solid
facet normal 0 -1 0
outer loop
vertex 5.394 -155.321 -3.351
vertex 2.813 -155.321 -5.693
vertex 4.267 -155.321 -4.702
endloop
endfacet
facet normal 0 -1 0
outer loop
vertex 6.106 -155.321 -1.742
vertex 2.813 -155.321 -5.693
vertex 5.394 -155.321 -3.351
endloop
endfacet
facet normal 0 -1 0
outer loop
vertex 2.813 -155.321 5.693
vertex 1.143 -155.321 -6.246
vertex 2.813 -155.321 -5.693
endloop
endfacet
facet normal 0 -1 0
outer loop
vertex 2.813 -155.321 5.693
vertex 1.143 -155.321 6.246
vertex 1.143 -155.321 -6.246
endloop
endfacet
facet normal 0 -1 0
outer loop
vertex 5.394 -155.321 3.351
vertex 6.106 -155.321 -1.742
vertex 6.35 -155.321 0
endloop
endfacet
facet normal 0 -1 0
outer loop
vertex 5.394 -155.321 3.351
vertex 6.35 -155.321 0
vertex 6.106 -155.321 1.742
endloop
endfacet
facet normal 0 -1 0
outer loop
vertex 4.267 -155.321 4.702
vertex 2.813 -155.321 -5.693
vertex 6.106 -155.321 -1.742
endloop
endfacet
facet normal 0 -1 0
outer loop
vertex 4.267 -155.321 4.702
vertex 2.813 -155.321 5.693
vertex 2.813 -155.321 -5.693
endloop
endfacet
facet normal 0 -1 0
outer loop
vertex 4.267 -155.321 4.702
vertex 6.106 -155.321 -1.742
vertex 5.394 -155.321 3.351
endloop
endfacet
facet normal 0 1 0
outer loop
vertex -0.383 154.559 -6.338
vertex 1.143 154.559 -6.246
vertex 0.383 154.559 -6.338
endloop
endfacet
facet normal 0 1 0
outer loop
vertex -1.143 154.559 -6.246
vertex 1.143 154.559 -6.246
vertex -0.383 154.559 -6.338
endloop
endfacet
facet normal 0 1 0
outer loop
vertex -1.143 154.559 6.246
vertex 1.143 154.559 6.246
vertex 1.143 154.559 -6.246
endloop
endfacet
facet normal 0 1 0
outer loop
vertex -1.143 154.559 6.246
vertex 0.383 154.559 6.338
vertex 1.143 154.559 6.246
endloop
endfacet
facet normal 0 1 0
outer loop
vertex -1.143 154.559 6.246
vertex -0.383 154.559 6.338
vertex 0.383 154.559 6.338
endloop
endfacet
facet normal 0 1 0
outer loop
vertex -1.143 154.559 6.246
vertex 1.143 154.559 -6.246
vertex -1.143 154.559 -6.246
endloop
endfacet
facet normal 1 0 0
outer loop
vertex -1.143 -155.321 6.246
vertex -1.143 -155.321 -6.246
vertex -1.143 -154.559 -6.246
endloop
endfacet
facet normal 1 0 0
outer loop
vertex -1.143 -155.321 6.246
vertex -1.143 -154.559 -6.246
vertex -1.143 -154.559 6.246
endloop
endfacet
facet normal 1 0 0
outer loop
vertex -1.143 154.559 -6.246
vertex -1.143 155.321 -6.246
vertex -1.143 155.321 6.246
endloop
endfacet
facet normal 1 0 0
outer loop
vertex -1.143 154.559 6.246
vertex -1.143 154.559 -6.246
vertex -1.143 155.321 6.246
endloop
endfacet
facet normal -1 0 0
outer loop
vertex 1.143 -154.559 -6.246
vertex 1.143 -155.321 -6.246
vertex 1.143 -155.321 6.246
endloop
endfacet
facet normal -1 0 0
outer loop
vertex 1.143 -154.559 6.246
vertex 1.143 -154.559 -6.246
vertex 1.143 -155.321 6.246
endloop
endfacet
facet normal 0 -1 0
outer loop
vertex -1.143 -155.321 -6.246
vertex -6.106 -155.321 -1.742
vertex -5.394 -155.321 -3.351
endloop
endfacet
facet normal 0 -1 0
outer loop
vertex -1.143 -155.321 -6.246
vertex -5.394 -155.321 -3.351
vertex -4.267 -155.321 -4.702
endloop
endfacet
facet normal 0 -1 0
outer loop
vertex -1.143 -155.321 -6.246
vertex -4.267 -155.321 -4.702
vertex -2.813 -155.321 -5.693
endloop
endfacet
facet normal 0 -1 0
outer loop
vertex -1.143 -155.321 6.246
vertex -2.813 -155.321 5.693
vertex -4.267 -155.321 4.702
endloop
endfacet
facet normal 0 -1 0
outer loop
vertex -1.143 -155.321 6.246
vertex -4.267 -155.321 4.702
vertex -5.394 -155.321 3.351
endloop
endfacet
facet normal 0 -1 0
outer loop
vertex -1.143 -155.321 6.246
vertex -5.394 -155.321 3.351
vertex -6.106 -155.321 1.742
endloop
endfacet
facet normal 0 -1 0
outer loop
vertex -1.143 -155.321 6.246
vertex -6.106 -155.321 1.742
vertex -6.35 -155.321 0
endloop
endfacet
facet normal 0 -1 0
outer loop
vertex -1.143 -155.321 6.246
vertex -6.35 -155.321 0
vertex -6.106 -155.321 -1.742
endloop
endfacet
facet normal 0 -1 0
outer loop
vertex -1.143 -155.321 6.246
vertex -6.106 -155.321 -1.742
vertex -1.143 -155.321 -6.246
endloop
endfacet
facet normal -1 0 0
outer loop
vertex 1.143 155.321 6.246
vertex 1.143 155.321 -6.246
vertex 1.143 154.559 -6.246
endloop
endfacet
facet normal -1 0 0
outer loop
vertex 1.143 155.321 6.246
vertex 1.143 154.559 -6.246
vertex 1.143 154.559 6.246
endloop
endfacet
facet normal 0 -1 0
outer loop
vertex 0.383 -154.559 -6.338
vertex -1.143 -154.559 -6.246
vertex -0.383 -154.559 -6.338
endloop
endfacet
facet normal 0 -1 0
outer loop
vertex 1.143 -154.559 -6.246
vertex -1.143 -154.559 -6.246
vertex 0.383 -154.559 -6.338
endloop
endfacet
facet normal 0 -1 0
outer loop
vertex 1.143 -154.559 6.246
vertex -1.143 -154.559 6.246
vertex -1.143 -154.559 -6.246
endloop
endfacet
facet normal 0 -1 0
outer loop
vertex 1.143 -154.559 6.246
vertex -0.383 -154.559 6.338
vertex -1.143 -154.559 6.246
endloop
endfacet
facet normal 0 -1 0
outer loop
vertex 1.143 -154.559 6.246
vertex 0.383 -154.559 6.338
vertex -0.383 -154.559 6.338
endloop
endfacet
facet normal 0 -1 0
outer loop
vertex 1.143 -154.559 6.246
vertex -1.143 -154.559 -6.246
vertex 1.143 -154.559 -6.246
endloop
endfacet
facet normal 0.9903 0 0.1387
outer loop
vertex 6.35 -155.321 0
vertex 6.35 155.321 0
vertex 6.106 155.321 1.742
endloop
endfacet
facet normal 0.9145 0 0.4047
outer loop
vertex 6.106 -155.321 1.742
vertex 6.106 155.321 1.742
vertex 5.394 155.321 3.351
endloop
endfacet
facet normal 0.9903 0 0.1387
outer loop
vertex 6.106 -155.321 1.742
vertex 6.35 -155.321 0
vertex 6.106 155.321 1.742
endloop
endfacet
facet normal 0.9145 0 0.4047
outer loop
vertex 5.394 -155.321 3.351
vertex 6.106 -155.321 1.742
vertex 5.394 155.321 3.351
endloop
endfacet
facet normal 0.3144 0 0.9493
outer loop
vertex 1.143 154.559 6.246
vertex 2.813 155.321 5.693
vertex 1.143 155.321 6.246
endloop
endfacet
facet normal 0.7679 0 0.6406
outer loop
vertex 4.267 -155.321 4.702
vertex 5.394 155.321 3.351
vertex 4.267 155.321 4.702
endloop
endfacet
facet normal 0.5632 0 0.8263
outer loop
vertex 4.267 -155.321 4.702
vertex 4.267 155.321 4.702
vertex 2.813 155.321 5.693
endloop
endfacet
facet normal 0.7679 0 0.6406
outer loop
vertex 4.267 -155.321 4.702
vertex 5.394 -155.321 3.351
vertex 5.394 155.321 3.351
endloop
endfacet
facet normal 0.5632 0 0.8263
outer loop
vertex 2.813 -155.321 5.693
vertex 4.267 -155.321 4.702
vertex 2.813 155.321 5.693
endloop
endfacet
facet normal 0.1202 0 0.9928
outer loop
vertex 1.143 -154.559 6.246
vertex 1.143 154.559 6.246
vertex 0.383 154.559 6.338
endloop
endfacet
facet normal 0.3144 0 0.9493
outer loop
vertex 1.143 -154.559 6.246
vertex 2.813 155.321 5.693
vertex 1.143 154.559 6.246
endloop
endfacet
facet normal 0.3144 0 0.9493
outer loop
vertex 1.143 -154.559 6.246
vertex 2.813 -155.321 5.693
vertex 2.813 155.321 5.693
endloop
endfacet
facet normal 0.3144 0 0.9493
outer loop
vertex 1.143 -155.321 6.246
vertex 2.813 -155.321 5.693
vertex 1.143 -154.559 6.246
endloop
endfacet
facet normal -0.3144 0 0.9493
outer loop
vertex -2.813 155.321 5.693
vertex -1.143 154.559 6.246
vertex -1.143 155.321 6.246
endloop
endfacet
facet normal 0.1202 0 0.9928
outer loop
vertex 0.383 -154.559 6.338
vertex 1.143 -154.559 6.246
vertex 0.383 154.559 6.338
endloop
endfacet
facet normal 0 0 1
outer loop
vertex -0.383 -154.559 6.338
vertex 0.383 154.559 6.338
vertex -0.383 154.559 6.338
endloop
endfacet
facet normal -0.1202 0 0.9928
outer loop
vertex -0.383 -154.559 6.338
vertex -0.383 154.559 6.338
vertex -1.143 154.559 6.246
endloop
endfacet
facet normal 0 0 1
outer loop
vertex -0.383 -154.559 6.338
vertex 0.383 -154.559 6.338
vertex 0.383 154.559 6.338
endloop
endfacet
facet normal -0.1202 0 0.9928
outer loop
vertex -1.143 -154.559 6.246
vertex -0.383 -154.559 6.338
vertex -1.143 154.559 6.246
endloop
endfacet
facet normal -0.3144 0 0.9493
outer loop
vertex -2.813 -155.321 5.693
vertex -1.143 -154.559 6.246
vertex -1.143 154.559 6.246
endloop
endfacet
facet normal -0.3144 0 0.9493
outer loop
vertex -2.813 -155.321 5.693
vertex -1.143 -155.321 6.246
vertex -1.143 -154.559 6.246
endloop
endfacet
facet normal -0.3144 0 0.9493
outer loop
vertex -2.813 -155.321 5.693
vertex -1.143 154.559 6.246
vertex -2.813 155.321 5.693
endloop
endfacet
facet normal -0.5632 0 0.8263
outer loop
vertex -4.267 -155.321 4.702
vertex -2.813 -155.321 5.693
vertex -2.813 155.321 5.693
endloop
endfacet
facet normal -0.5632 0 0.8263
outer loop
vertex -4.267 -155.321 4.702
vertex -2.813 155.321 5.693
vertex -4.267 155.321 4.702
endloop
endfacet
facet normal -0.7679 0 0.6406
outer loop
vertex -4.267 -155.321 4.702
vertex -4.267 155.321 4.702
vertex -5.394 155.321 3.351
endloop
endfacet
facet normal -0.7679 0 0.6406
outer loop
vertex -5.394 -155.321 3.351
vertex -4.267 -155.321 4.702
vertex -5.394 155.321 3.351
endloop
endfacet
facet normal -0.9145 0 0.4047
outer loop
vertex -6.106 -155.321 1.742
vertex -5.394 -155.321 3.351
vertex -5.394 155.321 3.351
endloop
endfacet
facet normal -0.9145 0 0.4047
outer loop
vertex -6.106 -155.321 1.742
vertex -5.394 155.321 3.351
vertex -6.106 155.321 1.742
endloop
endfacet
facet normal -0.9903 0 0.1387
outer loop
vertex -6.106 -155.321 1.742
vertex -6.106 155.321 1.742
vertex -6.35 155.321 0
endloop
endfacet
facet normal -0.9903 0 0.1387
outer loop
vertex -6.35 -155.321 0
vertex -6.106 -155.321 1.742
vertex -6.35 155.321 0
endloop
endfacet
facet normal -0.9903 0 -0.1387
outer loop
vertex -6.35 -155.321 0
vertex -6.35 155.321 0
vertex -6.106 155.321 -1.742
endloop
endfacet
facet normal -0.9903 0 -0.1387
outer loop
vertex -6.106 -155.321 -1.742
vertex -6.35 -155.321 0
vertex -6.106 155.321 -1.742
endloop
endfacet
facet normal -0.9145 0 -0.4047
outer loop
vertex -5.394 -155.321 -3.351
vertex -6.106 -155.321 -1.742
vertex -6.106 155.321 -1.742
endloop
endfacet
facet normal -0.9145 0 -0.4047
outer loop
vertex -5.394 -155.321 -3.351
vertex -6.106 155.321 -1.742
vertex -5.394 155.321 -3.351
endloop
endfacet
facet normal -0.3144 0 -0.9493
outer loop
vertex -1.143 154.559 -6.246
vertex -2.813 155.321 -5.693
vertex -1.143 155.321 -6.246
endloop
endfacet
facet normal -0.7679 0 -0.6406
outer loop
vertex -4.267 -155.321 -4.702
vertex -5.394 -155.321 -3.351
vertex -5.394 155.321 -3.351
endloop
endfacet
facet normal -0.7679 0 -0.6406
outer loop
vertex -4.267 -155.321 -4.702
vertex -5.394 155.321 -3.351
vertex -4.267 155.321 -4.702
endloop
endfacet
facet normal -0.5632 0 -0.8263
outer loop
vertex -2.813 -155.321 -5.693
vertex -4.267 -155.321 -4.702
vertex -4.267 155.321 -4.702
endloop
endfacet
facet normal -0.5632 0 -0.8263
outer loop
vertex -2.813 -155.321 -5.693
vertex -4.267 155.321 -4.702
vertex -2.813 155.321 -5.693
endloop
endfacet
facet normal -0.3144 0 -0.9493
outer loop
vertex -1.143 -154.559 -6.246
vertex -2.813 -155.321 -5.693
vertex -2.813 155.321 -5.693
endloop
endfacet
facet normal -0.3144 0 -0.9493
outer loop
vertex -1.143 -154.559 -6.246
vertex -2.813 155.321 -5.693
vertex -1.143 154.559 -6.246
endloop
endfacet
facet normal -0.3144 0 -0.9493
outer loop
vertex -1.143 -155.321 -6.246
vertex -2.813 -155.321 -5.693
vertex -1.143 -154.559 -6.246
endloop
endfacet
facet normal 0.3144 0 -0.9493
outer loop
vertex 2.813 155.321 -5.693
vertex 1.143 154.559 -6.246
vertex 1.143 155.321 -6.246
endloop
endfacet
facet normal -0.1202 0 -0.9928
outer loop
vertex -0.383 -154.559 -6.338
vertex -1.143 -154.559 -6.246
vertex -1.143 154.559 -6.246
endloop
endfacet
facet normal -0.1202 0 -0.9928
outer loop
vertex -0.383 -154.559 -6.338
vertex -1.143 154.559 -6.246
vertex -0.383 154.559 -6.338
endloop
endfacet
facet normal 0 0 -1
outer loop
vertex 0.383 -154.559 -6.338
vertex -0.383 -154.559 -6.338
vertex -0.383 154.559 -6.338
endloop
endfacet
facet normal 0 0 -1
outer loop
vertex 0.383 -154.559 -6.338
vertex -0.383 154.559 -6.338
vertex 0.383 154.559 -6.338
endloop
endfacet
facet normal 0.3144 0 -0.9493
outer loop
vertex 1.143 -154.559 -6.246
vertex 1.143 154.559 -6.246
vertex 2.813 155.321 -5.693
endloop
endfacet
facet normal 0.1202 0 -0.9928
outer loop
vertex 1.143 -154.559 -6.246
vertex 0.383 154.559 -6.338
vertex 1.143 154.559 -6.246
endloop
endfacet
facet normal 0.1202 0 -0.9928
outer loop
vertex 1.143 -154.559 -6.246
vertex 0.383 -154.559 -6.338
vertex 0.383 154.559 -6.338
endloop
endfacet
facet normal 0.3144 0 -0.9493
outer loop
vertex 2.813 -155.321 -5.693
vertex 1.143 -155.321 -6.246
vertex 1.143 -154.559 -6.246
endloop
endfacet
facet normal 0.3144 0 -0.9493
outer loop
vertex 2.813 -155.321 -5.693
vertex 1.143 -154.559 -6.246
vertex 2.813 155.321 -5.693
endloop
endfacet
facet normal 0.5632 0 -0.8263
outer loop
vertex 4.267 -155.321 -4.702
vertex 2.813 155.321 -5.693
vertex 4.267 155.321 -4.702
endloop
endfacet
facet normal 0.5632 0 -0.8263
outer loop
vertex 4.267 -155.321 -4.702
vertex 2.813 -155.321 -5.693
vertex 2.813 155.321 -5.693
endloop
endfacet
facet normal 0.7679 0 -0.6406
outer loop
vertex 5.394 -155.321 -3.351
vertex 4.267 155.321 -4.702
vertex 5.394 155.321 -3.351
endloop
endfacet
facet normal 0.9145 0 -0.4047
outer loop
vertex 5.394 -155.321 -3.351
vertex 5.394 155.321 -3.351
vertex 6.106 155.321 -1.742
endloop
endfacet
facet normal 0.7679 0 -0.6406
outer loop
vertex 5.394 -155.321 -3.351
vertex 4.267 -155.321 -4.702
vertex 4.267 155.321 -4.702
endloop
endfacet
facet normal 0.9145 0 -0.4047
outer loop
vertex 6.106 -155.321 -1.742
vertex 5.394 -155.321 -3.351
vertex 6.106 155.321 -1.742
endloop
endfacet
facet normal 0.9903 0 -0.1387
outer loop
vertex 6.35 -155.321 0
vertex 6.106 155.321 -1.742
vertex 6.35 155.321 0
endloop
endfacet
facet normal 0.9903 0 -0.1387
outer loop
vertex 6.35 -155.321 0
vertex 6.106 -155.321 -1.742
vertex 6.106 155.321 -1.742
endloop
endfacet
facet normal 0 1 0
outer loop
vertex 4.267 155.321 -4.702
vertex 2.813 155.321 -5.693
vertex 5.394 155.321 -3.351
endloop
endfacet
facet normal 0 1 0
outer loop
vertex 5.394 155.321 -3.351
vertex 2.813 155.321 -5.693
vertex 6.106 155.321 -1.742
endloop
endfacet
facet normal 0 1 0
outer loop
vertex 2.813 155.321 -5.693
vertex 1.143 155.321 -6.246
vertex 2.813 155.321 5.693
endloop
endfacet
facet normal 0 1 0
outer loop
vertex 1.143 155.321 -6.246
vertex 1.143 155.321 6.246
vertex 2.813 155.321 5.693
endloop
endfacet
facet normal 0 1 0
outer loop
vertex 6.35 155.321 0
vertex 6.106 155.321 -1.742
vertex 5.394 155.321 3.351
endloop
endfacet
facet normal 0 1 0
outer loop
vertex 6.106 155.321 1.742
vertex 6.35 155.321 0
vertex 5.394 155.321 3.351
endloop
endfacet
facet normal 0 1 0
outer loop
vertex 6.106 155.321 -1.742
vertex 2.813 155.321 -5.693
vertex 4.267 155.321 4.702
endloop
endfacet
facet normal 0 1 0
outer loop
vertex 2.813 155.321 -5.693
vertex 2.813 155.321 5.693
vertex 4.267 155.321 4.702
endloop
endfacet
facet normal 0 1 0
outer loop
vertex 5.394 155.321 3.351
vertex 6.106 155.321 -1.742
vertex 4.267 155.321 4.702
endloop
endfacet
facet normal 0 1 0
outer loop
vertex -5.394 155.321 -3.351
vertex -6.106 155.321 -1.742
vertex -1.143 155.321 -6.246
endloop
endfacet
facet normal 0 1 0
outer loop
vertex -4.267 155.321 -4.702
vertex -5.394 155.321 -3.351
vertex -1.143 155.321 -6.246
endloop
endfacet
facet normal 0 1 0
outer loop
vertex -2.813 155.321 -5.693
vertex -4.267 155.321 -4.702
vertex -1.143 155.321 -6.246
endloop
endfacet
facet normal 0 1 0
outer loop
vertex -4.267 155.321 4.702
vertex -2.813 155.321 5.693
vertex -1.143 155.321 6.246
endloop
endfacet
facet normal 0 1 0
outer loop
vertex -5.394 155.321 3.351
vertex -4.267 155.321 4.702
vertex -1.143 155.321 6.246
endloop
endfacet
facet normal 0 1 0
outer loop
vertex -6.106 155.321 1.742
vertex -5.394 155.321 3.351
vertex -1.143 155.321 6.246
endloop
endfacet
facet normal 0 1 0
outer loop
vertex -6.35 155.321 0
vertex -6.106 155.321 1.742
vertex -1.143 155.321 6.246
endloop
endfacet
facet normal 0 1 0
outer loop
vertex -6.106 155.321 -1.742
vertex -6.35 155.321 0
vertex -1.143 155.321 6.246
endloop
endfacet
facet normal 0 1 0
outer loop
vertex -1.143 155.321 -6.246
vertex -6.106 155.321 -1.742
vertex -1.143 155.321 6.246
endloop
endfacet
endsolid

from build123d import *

# Parameters (mm, degrees)
F0_R     = 6.35
F1_DEPTH = 155.321
F2_W     = 2.286
F2_H     = 12.7
F3_DEPTH = 0.762
F4_W     = 2.286
F4_H     = 12.7
F5_DEPTH = 0.762


with BuildPart() as f1:
    # F0 (on Front) → F1 (new body, symmetric)
    with BuildSketch(Plane.XZ):
        Circle(F0_R)
    extrude(amount=F1_DEPTH, both=True)

    # F2 (on face) → F3 (cut)
    with BuildSketch(Plane.XZ.offset(155.321)):
        Rectangle(F2_W, F2_H)
    extrude(amount=-F3_DEPTH, mode=Mode.SUBTRACT)

    # F4 (on face) → F5 (cut)
    with BuildSketch(Plane(origin=(0, 155.321, 0), x_dir=(-1, 0, 0), z_dir=(0, 1, 0))):
        Rectangle(F4_W, F4_H)
    extrude(amount=-F5_DEPTH, mode=Mode.SUBTRACT)


solid = f1.part
